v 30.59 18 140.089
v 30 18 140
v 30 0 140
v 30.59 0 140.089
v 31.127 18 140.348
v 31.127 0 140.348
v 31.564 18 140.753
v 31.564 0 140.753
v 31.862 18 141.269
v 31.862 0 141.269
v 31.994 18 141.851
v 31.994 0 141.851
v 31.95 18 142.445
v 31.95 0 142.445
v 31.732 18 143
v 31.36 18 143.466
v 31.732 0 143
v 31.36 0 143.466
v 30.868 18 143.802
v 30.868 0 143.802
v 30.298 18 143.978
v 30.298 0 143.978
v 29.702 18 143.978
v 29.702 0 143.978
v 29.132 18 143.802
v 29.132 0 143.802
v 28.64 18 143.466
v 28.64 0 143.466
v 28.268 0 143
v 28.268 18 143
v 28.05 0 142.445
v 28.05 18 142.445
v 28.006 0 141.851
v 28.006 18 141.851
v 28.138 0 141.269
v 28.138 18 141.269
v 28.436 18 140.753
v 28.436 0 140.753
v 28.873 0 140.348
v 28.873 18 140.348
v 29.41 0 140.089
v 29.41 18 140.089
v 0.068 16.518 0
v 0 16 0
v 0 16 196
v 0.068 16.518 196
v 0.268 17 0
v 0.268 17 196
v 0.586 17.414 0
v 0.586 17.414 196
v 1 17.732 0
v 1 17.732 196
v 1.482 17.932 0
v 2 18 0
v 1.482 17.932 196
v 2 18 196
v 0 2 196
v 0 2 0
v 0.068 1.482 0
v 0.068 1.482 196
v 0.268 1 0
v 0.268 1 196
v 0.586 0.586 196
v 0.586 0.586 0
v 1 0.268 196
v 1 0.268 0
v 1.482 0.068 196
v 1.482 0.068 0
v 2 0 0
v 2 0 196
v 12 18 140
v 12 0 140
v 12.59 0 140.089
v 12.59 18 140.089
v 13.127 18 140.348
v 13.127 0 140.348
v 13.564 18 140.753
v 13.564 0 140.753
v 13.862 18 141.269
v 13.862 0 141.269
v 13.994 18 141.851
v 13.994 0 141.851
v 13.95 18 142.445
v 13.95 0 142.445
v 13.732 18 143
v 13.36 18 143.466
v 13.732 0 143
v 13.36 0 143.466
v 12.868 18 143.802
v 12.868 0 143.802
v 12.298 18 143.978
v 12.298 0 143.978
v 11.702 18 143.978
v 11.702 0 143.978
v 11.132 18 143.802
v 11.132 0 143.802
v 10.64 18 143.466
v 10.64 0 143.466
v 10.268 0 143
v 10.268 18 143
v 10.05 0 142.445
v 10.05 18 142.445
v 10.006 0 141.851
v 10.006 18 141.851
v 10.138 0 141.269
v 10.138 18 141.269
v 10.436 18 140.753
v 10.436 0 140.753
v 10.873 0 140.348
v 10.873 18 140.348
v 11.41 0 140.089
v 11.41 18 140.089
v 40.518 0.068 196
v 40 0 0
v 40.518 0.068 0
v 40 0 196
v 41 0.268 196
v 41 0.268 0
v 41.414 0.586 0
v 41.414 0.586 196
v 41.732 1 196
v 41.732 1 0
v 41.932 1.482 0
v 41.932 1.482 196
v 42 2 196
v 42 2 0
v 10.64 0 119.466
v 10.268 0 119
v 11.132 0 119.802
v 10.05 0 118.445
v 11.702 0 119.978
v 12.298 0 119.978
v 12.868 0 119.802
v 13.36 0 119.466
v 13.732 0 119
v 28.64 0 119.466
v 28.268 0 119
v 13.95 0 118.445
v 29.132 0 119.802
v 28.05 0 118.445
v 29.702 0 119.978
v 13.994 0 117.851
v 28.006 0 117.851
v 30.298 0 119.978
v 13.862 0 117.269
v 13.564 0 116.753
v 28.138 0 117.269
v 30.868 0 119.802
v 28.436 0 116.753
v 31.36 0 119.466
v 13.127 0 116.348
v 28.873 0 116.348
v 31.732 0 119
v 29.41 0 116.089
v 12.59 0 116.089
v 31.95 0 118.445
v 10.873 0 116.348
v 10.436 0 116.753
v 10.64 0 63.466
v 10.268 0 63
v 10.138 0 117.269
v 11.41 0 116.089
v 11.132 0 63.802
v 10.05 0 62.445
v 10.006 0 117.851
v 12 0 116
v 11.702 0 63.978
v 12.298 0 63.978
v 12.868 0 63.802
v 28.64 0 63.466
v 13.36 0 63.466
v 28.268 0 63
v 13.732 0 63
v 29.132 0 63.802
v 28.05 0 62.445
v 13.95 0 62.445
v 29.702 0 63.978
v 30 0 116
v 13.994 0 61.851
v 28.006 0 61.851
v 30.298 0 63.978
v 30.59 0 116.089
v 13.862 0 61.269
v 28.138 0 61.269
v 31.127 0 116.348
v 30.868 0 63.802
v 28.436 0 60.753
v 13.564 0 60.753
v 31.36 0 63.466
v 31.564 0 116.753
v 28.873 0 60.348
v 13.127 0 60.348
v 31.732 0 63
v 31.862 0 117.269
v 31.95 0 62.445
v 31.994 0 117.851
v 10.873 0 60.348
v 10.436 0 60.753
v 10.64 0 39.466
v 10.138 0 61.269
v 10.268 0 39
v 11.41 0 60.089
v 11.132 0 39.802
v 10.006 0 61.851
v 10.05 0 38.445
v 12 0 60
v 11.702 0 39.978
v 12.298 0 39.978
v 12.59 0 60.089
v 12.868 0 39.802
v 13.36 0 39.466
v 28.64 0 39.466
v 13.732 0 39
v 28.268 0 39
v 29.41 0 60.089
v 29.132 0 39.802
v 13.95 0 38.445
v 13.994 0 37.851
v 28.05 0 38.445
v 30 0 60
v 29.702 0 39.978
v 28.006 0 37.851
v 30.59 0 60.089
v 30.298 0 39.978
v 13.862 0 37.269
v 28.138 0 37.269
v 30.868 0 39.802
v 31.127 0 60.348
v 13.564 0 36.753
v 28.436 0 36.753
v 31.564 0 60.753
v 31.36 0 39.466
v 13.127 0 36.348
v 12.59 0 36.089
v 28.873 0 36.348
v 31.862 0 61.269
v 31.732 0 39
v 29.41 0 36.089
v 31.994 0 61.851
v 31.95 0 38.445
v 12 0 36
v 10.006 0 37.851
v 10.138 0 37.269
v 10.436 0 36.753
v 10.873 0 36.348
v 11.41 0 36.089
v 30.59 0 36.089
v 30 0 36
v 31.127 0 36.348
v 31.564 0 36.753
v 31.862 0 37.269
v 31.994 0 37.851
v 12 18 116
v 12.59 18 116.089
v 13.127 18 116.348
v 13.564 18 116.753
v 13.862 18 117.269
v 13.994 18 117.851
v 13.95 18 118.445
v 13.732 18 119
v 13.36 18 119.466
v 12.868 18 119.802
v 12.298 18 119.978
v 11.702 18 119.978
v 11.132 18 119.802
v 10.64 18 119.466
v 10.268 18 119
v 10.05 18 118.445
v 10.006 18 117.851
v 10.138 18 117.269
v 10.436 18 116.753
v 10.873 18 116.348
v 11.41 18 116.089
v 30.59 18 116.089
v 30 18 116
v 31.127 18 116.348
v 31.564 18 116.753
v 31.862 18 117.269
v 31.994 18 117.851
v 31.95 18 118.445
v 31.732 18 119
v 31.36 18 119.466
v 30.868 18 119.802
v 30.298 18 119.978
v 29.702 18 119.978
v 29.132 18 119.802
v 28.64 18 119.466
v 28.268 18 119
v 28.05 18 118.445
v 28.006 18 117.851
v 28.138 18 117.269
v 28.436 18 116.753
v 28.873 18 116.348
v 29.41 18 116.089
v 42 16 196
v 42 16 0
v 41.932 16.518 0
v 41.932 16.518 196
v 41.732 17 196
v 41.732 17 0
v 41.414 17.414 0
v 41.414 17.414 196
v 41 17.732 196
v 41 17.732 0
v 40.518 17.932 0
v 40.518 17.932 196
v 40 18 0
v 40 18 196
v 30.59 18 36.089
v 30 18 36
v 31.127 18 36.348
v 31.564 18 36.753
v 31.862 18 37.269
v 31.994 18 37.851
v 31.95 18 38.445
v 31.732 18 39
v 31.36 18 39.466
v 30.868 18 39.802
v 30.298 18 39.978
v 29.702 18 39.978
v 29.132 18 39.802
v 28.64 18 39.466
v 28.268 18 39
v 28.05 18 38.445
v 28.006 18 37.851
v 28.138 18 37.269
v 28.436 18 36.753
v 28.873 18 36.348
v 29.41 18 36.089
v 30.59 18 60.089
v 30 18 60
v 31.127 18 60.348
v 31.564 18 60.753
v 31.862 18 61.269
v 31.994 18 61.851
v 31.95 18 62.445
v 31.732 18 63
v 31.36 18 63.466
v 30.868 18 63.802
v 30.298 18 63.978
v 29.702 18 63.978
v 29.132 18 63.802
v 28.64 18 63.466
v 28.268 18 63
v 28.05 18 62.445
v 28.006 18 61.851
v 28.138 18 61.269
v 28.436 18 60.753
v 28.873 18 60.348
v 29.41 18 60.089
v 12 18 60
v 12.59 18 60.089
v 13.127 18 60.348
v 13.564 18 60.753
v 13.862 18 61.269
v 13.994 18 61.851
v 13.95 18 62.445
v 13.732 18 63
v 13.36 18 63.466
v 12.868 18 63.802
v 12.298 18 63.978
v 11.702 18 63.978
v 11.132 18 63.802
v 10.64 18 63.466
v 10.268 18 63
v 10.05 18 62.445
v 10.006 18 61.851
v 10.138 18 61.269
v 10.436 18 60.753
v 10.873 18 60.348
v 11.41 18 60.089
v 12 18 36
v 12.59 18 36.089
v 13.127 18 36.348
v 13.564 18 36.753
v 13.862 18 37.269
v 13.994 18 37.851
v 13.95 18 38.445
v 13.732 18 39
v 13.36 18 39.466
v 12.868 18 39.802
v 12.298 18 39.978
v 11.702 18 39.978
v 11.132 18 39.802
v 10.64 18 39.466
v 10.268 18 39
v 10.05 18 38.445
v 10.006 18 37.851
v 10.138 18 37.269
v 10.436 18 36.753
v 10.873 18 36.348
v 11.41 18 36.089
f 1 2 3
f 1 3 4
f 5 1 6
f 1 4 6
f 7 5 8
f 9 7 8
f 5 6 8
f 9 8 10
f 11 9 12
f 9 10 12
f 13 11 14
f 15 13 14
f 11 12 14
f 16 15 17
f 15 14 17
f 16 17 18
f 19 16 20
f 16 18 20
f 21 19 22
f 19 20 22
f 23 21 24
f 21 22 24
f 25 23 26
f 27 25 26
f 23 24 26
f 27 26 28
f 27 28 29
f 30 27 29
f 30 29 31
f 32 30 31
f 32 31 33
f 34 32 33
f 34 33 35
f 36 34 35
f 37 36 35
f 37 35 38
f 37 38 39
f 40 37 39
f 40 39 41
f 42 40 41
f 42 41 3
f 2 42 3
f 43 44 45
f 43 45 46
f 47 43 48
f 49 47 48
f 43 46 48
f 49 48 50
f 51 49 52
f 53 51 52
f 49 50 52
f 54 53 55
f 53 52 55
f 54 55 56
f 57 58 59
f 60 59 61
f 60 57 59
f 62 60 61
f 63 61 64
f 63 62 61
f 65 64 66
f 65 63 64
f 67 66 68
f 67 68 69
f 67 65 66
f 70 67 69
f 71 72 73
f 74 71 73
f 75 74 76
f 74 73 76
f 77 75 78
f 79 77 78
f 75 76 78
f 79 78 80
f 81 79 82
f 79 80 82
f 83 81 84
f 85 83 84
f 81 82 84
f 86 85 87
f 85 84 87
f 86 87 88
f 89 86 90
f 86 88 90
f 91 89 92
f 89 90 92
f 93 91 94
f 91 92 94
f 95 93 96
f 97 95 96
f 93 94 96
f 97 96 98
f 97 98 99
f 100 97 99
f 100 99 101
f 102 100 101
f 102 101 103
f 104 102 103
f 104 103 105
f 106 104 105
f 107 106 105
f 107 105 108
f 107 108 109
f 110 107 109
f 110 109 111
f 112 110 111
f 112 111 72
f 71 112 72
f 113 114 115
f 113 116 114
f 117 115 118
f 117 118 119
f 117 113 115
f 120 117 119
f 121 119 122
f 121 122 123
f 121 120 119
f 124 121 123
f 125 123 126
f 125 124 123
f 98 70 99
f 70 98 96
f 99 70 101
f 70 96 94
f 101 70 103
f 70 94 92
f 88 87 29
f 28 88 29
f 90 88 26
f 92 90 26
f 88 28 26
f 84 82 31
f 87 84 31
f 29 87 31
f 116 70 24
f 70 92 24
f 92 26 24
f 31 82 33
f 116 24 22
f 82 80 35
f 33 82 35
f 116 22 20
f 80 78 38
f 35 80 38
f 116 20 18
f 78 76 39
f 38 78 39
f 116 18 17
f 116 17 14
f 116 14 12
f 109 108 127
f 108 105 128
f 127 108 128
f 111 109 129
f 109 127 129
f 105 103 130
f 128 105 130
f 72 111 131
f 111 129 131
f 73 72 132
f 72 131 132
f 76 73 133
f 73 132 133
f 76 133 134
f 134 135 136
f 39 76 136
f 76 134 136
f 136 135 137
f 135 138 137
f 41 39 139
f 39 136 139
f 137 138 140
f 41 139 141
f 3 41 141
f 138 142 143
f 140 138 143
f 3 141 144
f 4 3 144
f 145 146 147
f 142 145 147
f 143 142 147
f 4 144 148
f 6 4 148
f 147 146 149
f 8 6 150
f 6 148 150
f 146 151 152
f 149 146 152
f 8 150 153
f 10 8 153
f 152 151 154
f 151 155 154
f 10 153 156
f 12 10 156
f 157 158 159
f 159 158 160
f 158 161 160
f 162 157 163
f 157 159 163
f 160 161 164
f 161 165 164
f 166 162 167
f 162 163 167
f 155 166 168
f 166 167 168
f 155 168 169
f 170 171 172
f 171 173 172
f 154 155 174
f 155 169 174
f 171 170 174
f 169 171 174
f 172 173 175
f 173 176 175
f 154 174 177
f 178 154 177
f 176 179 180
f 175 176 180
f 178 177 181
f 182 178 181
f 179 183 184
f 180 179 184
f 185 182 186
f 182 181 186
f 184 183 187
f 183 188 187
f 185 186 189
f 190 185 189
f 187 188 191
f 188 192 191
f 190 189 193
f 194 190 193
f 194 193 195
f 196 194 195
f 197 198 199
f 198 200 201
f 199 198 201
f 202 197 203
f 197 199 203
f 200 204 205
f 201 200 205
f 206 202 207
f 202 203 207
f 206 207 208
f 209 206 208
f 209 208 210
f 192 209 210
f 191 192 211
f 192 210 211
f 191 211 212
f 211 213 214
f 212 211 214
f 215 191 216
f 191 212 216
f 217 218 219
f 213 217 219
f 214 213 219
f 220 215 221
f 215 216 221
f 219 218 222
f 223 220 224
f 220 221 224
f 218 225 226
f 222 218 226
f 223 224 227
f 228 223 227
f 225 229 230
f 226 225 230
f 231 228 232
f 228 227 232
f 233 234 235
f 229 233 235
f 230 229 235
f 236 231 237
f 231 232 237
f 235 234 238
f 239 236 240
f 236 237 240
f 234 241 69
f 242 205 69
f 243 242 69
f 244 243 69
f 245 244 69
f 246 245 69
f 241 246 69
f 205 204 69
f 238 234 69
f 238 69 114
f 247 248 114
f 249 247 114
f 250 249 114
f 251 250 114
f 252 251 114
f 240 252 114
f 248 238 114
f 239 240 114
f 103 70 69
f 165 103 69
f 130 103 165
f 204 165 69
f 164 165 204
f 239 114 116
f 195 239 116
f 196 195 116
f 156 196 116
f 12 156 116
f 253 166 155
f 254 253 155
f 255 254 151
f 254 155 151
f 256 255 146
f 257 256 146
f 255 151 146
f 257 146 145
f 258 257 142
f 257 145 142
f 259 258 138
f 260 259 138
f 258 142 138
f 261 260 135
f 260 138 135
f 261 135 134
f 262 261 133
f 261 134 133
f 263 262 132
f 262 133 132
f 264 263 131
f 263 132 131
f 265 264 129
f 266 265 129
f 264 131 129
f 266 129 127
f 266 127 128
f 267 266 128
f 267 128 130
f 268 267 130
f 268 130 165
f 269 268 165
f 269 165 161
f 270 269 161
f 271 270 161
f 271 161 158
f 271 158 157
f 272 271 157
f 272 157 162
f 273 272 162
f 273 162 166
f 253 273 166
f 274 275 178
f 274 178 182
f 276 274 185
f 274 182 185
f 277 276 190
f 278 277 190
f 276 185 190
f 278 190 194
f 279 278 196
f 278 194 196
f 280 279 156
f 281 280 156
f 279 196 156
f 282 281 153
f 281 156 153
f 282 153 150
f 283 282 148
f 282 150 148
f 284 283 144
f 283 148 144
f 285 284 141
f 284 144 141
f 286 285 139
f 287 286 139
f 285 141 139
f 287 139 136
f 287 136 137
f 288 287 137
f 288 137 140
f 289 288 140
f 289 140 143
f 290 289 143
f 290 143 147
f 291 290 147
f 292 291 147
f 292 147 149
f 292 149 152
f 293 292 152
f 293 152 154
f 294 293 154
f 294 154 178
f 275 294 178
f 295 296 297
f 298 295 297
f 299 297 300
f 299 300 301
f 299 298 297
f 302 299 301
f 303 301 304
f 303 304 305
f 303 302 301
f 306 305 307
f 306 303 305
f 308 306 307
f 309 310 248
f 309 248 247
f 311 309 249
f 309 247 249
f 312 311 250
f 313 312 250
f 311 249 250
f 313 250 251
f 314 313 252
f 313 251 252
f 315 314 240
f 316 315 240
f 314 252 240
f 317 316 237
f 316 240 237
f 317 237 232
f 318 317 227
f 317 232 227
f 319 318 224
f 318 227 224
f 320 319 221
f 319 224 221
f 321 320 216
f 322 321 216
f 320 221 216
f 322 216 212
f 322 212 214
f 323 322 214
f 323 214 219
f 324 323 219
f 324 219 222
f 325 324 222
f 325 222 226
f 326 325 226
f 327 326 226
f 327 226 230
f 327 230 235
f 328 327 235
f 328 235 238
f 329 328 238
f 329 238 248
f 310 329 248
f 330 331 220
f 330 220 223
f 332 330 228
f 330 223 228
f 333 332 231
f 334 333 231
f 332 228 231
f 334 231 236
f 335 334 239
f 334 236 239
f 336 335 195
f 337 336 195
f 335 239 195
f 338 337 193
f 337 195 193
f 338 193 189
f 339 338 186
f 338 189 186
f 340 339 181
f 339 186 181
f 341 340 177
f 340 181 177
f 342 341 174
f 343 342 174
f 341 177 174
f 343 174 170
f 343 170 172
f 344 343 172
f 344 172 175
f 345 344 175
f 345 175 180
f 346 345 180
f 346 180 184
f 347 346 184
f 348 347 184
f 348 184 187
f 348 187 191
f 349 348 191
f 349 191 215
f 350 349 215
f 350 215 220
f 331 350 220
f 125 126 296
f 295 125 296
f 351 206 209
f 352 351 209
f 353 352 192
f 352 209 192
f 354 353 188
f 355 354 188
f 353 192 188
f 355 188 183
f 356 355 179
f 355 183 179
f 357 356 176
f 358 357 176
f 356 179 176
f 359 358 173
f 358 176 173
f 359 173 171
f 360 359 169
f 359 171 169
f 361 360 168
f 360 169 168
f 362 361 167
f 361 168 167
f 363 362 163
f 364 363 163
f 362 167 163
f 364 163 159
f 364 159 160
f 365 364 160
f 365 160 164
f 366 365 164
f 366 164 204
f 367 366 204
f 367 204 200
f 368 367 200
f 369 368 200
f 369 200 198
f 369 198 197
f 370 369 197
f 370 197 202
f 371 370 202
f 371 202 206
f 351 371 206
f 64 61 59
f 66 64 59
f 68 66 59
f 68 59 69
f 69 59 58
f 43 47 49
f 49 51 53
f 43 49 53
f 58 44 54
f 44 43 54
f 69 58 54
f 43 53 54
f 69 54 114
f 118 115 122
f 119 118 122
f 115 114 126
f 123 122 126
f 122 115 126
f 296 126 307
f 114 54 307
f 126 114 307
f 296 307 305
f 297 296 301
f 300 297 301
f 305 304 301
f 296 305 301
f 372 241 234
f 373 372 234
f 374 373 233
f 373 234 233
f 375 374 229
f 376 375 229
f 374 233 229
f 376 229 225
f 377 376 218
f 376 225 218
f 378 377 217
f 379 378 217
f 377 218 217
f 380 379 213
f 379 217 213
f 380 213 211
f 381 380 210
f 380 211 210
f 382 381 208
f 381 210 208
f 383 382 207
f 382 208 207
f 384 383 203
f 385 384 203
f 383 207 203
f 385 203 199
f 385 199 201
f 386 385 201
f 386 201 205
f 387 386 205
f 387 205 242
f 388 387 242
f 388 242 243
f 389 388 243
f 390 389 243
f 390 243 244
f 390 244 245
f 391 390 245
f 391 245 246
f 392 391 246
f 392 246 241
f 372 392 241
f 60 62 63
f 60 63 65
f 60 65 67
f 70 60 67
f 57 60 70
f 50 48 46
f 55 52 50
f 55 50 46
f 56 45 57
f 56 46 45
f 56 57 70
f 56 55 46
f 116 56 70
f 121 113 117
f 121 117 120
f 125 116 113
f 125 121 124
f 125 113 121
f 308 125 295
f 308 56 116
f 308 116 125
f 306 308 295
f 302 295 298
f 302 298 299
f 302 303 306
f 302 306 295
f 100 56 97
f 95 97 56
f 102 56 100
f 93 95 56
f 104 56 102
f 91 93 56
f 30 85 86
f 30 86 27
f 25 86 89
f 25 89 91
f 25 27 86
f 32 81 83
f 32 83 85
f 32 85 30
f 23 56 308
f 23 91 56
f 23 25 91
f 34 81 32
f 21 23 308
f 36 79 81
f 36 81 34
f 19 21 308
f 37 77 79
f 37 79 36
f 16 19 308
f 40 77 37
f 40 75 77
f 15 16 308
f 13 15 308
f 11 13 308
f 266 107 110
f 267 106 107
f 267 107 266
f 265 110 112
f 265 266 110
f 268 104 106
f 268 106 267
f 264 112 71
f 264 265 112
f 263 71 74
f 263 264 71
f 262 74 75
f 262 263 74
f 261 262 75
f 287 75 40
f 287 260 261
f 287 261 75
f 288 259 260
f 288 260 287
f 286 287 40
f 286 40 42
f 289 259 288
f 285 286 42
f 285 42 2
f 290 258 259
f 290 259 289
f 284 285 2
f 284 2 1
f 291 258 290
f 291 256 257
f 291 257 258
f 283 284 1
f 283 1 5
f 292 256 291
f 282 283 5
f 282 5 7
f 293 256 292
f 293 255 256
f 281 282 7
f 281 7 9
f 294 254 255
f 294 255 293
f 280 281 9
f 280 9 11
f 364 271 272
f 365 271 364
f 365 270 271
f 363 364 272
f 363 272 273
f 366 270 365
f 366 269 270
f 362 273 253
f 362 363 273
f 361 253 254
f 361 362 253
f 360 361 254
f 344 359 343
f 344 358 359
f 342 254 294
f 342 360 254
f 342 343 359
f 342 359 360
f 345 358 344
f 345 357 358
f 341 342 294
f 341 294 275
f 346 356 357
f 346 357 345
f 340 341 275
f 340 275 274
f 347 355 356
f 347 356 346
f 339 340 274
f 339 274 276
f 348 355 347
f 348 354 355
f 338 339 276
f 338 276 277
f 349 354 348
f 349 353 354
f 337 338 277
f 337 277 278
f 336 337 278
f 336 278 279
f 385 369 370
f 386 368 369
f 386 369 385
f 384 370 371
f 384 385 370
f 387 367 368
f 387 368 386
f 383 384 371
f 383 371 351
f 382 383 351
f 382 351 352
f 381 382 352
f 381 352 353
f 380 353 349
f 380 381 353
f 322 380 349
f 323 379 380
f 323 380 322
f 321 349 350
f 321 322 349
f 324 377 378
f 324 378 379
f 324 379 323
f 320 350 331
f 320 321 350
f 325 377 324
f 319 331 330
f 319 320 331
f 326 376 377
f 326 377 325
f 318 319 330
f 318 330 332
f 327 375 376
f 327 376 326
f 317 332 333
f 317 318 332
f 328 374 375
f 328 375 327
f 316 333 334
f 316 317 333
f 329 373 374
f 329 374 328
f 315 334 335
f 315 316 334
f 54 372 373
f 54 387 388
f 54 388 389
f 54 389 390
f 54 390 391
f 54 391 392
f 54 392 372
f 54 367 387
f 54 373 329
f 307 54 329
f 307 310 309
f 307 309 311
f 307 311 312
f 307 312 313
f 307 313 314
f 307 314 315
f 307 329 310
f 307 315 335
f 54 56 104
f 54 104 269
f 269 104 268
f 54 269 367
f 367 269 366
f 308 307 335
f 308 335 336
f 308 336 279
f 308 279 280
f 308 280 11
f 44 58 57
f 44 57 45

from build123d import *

# Parameters (mm, degrees)
SKETCH1_W           = 42
SKETCH1_H           = 18
BOSS_EXTRUDE1_DEPTH = 196
FILLET1_R           = 2
SKETCH2_R           = 2
CUT_EXTRUDE1_DEPTH  = 202.25605581


with BuildPart() as part:
    # Sketch1 → Boss-Extrude1 (new body)
    with BuildSketch(Plane.XY):
        with Locations((21, 9)):
            Rectangle(SKETCH1_W, SKETCH1_H)
    extrude(amount=BOSS_EXTRUDE1_DEPTH)

    # Fillet1
    fillet1_edges = [part.edges().sort_by_distance(p)[0] for p in [
        (0, 18, 98),
        (42, 18, 98),
        (42, 0, 98),
        (0, 0, 98),
    ]]
    fillet(fillet1_edges, radius=FILLET1_R)

    # Sketch2 → Cut-Extrude1 (cut, through all)
    with BuildSketch(Plane.XZ):
        with Locations(Location((12, 142, 0), (0, 0, 270))):
            Circle(SKETCH2_R)
        with Locations(Location((30, 142, 0), (0, 0, 270))):
            Circle(SKETCH2_R)
        with Locations(Location((12, 118, 0), (0, 0, 270))):
            Circle(SKETCH2_R)
        with Locations(Location((30, 118, 0), (0, 0, 270))):
            Circle(SKETCH2_R)
        with Locations(Location((12, 62, 0), (0, 0, 270))):
            Circle(SKETCH2_R)
        with Locations(Location((30, 62, 0), (0, 0, 270))):
            Circle(SKETCH2_R)
        with Locations(Location((30, 38, 0), (0, 0, 270))):
            Circle(SKETCH2_R)
        with Locations(Location((12, 38, 0), (0, 0, 270))):
            Circle(SKETCH2_R)
    extrude(amount=-CUT_EXTRUDE1_DEPTH, mode=Mode.SUBTRACT)


solid = part.part
